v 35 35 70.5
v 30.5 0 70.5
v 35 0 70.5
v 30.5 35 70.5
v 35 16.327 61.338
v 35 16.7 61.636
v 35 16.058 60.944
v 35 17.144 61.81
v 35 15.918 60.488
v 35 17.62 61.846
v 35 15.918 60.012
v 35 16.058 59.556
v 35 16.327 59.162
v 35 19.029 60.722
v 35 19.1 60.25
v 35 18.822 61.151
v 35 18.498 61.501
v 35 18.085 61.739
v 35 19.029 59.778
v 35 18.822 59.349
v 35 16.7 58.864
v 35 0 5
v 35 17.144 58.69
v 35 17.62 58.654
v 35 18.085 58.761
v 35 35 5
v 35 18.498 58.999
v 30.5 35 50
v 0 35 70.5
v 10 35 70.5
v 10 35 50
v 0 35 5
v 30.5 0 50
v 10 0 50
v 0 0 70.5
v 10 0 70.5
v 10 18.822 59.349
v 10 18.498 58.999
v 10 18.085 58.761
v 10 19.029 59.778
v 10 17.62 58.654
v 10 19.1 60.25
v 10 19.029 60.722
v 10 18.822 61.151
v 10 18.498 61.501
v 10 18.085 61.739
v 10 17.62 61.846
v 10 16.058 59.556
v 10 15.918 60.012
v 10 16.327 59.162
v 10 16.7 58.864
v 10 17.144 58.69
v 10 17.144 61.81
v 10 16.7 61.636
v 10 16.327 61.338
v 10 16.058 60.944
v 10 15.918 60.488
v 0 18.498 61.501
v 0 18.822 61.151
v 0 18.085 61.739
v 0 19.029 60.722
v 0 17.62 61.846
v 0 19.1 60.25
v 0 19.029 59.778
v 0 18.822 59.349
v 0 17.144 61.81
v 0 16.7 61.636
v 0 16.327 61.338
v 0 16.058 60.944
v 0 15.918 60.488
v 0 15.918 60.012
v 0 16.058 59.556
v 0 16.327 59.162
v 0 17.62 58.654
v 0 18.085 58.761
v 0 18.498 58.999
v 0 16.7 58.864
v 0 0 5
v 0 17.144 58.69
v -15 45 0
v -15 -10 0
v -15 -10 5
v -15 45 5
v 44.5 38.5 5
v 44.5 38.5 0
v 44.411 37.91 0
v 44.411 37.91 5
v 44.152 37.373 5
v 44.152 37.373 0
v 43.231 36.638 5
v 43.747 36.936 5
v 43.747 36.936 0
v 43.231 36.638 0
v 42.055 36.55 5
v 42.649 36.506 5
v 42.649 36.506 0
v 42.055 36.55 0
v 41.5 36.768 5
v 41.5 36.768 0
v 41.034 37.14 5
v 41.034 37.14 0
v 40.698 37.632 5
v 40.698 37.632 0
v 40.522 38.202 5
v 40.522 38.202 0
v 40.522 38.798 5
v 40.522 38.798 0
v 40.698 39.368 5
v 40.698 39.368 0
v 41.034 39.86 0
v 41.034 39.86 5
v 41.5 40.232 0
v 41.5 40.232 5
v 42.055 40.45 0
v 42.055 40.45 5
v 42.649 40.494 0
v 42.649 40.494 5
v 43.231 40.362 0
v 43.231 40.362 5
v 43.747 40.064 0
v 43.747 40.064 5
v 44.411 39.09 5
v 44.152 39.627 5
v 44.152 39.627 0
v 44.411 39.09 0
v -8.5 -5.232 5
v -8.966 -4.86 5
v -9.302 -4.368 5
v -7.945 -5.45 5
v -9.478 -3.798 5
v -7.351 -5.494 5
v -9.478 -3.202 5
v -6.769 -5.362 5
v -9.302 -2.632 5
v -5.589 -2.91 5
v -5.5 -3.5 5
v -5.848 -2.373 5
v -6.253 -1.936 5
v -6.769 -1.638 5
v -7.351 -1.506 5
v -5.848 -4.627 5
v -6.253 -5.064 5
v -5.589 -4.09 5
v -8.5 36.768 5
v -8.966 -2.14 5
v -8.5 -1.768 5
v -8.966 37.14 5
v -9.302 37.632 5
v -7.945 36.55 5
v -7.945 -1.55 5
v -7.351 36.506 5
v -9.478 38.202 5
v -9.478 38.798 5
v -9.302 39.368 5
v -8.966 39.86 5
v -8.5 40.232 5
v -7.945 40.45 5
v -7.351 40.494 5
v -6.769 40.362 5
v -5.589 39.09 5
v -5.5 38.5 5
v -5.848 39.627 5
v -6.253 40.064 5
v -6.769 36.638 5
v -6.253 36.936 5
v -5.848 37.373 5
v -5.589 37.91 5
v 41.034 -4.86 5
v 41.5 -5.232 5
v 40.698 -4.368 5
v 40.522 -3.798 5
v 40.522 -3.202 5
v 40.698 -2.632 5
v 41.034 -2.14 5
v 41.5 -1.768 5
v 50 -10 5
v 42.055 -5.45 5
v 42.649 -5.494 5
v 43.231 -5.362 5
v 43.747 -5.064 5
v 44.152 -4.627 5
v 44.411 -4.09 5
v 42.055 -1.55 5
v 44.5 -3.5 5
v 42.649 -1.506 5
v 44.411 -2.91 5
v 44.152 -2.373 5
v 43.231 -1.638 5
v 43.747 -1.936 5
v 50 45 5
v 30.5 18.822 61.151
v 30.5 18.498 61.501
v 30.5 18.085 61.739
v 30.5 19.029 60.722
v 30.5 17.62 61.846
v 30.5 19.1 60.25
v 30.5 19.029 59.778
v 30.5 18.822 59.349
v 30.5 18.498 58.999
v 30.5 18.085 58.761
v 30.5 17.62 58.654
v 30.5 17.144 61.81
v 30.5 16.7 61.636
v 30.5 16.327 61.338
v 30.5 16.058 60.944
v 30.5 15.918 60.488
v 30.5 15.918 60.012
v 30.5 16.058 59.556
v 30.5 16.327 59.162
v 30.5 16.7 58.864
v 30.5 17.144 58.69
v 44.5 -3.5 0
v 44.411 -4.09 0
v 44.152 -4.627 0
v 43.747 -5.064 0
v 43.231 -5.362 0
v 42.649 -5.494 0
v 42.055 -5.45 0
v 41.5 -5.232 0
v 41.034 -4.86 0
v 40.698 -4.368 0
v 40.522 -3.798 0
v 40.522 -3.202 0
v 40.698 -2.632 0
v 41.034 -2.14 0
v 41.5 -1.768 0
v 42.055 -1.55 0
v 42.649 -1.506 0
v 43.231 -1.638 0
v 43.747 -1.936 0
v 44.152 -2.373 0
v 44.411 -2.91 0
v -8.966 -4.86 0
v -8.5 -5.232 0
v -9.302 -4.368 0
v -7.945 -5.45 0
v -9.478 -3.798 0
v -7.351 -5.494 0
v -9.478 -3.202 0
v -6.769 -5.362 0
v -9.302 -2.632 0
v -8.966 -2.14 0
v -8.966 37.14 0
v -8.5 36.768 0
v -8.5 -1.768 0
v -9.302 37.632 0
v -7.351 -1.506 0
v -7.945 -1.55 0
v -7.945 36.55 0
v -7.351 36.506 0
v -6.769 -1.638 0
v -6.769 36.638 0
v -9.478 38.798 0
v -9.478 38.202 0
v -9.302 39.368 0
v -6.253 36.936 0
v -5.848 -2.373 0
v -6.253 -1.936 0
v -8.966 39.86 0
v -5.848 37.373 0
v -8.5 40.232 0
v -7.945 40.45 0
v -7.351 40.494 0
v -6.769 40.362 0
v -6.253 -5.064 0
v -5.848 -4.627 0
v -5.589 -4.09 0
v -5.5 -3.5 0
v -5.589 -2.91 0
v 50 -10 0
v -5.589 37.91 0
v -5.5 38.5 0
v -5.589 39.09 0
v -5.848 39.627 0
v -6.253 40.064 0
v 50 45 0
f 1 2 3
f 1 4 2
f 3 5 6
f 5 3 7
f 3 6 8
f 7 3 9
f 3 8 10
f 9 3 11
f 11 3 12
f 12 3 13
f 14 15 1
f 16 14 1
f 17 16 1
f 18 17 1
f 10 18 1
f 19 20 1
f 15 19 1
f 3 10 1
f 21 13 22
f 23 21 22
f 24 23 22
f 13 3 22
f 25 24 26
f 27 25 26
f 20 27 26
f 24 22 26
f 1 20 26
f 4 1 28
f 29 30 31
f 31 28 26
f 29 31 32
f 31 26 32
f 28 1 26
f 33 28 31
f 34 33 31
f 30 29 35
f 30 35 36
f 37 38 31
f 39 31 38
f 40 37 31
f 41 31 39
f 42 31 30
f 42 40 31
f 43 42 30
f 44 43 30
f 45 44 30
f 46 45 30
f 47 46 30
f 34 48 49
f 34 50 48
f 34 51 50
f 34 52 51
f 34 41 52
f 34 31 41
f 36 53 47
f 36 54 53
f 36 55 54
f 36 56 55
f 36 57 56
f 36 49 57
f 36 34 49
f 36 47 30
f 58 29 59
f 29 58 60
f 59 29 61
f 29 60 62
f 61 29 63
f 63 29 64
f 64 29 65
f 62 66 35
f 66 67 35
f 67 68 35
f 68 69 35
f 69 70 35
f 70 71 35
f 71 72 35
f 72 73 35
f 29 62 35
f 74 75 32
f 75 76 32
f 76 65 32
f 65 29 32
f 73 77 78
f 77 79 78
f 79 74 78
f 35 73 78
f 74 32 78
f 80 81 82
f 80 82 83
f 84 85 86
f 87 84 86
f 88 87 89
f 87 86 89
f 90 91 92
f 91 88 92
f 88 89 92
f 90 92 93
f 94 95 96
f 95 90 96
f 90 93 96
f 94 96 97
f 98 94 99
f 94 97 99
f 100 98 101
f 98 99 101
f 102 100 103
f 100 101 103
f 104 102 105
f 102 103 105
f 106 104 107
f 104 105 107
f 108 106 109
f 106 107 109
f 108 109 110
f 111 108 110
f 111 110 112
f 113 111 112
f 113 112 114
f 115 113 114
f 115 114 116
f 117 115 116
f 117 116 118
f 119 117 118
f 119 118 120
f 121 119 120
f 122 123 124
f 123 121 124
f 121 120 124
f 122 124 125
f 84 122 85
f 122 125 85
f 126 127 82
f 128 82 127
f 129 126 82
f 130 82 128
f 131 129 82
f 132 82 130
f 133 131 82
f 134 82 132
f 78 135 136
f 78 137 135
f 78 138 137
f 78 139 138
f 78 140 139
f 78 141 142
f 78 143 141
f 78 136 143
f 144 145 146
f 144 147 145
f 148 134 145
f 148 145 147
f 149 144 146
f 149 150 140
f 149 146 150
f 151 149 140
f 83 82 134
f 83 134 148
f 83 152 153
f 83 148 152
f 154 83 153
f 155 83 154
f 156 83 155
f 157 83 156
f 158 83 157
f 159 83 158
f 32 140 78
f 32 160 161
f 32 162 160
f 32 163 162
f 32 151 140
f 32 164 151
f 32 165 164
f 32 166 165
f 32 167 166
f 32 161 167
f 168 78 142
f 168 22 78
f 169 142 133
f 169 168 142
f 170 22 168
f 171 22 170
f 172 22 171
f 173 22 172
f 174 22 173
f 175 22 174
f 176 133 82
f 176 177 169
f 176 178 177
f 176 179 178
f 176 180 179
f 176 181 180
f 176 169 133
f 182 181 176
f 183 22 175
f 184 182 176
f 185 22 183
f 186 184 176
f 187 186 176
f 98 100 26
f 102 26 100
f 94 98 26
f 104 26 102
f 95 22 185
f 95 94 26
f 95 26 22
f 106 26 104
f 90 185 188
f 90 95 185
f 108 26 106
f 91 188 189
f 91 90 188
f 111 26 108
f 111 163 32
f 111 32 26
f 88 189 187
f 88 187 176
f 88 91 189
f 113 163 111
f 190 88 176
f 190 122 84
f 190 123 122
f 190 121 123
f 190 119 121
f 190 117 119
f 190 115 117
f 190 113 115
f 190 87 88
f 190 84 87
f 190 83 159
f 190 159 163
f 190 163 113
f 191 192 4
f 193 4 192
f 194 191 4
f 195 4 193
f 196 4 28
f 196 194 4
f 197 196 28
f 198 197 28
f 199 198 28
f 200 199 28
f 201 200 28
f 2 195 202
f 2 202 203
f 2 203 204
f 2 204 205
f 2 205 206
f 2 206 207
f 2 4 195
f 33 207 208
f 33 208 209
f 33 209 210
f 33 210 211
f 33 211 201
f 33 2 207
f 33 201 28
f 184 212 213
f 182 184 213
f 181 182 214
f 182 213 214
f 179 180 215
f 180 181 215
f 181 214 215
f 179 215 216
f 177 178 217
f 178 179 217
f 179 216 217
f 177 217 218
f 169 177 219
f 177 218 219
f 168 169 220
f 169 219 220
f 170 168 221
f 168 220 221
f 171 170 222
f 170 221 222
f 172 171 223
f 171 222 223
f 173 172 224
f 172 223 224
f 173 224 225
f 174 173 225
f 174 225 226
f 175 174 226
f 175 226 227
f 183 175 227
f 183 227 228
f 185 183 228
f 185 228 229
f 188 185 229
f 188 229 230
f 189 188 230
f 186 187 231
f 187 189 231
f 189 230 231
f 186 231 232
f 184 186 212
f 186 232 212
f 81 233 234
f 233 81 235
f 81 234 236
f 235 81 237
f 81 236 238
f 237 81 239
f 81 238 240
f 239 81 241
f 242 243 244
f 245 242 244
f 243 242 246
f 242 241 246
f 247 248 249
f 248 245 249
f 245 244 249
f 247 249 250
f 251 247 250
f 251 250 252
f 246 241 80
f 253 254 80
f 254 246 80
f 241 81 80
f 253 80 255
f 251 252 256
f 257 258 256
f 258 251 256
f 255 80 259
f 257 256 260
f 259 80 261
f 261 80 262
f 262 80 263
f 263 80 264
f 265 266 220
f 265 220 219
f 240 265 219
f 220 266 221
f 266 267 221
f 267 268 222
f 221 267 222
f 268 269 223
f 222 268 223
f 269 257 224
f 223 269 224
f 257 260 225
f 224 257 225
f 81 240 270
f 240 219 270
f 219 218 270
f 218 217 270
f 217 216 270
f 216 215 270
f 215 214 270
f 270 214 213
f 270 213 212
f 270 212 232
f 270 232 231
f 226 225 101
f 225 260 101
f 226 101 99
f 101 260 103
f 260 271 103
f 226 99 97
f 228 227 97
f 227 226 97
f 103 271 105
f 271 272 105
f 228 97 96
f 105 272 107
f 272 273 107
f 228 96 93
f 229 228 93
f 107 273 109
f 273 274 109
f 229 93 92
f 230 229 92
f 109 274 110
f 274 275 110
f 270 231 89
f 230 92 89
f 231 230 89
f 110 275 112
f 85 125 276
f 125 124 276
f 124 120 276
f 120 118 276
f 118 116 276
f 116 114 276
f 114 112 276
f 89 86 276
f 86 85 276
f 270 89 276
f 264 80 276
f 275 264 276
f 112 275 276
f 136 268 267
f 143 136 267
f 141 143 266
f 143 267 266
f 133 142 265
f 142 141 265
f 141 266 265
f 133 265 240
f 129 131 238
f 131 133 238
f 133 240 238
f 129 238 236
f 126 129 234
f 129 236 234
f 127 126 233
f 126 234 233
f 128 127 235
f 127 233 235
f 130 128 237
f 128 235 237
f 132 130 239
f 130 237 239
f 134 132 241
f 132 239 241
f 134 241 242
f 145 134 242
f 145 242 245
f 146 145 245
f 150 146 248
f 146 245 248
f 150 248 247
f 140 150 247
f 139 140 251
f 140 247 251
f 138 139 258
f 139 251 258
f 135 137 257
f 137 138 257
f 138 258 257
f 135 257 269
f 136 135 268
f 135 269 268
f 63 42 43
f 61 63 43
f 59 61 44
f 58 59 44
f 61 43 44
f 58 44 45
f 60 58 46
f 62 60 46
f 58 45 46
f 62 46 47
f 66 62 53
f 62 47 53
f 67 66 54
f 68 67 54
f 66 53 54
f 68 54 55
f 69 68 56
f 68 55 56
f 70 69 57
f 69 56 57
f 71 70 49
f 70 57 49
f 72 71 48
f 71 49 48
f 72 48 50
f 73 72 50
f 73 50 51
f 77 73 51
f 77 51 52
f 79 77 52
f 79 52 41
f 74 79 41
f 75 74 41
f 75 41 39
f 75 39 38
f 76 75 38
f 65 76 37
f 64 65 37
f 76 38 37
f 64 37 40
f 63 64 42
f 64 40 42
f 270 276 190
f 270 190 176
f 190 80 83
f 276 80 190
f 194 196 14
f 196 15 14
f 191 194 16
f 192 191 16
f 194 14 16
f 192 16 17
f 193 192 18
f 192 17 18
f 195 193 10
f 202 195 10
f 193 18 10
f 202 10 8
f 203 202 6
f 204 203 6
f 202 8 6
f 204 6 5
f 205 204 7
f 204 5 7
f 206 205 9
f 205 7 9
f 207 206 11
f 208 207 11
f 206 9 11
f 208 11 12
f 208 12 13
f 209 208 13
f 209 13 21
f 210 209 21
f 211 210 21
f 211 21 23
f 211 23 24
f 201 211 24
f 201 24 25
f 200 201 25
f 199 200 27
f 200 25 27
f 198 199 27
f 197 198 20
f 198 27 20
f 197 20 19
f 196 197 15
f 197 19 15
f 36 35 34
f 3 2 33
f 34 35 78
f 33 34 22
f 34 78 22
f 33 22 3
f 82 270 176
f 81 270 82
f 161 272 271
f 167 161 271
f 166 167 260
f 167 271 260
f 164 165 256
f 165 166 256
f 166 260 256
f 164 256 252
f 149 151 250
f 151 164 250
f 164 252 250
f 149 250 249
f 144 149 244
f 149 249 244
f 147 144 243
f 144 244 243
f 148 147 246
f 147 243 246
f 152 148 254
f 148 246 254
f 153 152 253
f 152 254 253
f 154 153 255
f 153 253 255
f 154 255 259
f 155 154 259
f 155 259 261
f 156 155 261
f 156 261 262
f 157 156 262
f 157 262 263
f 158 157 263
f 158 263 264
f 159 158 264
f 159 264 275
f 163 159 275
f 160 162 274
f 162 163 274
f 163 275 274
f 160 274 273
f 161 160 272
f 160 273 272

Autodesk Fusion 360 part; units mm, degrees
sketch "Boceto2" plane through (0, 0, 0) normal (0, 0, 1) x (1, 0, 0)
  line L0 (0, 0) -> (35, 0)
  line L1 (35, 0) -> (35, 35)
  line L2 (35, 35) -> (0, 35)
  line L3 (0, 35) -> (0, 0)
  line L4 (50, -10) -> (-15, -10)
  line L5 (-15, -10) -> (-15, 45)
  line L6 (-15, 45) -> (50, 45)
  line L7 (50, 45) -> (50, -10)
  line L8 (50, -10) -> (-15, 45) construction
  line L9 (-15, -10) -> (50, 45) construction
  line L10 (42.5, 38.5) -> (-7.5, 38.5) construction
  line L11 (-7.5, 38.5) -> (-7.5, -3.5) construction
  line L12 (-7.5, -3.5) -> (42.5, -3.5) construction
  line L13 (42.5, -3.5) -> (42.5, 38.5) construction
  line L14 (42.5, 38.5) -> (-7.5, -3.5) construction
  line L15 (-7.5, 38.5) -> (42.5, -3.5) construction
  circle A0 centre (42.5, 38.5) radius 2
  line L16 (17.5, 45) -> (17.5, -10) construction
  line L17 (-15, 17.5) -> (50, 17.5) construction
  circle A1 centre (-7.5, 38.5) radius 2
  circle A2 centre (-7.5, -3.5) radius 2
  circle A3 centre (42.5, -3.5) radius 2
  point P0 (17.5, 17.5)
  point P1 (17.5, 17.5)
  dimension "d8" = 35
  dimension "d9" = 35
  dimension "d10" = 15
  dimension "d12" = 10
  dimension "d13" = 10
  dimension "d14" = 15
  dimension "d15" = 50
  dimension "d16" = 42
  dimension "d17" = 4
extrude "Extruir1" add sketch "Boceto2" along normal blind 70.5 contours L0 L1 L2 L3
sketch "Boceto3" plane through (0, 0, 0) normal (0, -1, 0) x (1, 0, 0)
  line L0 (0, 0) -> (35, 0)
  line L1 (35, 0) -> (35, 70.5)
  line L2 (35, 70.5) -> (0, 70.5)
  line L3 (0, 70.5) -> (0, 0)
  line L4 (0, 70.5) -> (10, 70.5)
  line L5 (10, 70.5) -> (30.5, 70.5)
  line L6 (30.5, 70.5) -> (30.5, 50)
  line L7 (30.5, 50) -> (10, 50)
  line L8 (10, 50) -> (10, 70.5)
  dimension "d3" = 10
  dimension "d4" = 20.5
  dimension "d5" = 20.5
extrude "Extruir2" cut sketch "Boceto3" against normal blind 35 contours L2 L5 L6 L7 L8
sketch "Boceto4" plane through (0, 0, 50) normal (0, 0, 1) x (-1, 0, 0)
  line L0 (-10, 0) -> (-30.5, 0)
  line L1 (-30.5, 0) -> (-30.5, -35)
  line L2 (-30.5, -35) -> (-10, -35)
  line L3 (-10, -35) -> (-10, 0)
  line L4 (-20.25, -35) -> (-20.25, 0)
extrude "Extruir3" add sketch "Boceto2" along normal blind 5
sketch "Boceto5" plane through (35, 0, 0) normal (1, 0, 0) x (0, 1, 0)
  line L0 (0, 5) -> (35, 5)
  line L1 (35, 5) -> (35, 70.5)
  line L2 (35, 70.5) -> (0, 70.5)
  line L3 (0, 70.5) -> (0, 5)
  line L4 (0, 70.5) -> (35, 70.5)
  line L5 (35, 70.5) -> (35, 50)
  line L6 (35, 50) -> (0, 50)
  line L7 (0, 50) -> (0, 70.5)
  circle A0 centre (17.5, 60.25) radius 1.6
  dimension "d20" = 3.2
extrude "Extruir4" cut sketch "Boceto5" against normal blind 45 contours A0
